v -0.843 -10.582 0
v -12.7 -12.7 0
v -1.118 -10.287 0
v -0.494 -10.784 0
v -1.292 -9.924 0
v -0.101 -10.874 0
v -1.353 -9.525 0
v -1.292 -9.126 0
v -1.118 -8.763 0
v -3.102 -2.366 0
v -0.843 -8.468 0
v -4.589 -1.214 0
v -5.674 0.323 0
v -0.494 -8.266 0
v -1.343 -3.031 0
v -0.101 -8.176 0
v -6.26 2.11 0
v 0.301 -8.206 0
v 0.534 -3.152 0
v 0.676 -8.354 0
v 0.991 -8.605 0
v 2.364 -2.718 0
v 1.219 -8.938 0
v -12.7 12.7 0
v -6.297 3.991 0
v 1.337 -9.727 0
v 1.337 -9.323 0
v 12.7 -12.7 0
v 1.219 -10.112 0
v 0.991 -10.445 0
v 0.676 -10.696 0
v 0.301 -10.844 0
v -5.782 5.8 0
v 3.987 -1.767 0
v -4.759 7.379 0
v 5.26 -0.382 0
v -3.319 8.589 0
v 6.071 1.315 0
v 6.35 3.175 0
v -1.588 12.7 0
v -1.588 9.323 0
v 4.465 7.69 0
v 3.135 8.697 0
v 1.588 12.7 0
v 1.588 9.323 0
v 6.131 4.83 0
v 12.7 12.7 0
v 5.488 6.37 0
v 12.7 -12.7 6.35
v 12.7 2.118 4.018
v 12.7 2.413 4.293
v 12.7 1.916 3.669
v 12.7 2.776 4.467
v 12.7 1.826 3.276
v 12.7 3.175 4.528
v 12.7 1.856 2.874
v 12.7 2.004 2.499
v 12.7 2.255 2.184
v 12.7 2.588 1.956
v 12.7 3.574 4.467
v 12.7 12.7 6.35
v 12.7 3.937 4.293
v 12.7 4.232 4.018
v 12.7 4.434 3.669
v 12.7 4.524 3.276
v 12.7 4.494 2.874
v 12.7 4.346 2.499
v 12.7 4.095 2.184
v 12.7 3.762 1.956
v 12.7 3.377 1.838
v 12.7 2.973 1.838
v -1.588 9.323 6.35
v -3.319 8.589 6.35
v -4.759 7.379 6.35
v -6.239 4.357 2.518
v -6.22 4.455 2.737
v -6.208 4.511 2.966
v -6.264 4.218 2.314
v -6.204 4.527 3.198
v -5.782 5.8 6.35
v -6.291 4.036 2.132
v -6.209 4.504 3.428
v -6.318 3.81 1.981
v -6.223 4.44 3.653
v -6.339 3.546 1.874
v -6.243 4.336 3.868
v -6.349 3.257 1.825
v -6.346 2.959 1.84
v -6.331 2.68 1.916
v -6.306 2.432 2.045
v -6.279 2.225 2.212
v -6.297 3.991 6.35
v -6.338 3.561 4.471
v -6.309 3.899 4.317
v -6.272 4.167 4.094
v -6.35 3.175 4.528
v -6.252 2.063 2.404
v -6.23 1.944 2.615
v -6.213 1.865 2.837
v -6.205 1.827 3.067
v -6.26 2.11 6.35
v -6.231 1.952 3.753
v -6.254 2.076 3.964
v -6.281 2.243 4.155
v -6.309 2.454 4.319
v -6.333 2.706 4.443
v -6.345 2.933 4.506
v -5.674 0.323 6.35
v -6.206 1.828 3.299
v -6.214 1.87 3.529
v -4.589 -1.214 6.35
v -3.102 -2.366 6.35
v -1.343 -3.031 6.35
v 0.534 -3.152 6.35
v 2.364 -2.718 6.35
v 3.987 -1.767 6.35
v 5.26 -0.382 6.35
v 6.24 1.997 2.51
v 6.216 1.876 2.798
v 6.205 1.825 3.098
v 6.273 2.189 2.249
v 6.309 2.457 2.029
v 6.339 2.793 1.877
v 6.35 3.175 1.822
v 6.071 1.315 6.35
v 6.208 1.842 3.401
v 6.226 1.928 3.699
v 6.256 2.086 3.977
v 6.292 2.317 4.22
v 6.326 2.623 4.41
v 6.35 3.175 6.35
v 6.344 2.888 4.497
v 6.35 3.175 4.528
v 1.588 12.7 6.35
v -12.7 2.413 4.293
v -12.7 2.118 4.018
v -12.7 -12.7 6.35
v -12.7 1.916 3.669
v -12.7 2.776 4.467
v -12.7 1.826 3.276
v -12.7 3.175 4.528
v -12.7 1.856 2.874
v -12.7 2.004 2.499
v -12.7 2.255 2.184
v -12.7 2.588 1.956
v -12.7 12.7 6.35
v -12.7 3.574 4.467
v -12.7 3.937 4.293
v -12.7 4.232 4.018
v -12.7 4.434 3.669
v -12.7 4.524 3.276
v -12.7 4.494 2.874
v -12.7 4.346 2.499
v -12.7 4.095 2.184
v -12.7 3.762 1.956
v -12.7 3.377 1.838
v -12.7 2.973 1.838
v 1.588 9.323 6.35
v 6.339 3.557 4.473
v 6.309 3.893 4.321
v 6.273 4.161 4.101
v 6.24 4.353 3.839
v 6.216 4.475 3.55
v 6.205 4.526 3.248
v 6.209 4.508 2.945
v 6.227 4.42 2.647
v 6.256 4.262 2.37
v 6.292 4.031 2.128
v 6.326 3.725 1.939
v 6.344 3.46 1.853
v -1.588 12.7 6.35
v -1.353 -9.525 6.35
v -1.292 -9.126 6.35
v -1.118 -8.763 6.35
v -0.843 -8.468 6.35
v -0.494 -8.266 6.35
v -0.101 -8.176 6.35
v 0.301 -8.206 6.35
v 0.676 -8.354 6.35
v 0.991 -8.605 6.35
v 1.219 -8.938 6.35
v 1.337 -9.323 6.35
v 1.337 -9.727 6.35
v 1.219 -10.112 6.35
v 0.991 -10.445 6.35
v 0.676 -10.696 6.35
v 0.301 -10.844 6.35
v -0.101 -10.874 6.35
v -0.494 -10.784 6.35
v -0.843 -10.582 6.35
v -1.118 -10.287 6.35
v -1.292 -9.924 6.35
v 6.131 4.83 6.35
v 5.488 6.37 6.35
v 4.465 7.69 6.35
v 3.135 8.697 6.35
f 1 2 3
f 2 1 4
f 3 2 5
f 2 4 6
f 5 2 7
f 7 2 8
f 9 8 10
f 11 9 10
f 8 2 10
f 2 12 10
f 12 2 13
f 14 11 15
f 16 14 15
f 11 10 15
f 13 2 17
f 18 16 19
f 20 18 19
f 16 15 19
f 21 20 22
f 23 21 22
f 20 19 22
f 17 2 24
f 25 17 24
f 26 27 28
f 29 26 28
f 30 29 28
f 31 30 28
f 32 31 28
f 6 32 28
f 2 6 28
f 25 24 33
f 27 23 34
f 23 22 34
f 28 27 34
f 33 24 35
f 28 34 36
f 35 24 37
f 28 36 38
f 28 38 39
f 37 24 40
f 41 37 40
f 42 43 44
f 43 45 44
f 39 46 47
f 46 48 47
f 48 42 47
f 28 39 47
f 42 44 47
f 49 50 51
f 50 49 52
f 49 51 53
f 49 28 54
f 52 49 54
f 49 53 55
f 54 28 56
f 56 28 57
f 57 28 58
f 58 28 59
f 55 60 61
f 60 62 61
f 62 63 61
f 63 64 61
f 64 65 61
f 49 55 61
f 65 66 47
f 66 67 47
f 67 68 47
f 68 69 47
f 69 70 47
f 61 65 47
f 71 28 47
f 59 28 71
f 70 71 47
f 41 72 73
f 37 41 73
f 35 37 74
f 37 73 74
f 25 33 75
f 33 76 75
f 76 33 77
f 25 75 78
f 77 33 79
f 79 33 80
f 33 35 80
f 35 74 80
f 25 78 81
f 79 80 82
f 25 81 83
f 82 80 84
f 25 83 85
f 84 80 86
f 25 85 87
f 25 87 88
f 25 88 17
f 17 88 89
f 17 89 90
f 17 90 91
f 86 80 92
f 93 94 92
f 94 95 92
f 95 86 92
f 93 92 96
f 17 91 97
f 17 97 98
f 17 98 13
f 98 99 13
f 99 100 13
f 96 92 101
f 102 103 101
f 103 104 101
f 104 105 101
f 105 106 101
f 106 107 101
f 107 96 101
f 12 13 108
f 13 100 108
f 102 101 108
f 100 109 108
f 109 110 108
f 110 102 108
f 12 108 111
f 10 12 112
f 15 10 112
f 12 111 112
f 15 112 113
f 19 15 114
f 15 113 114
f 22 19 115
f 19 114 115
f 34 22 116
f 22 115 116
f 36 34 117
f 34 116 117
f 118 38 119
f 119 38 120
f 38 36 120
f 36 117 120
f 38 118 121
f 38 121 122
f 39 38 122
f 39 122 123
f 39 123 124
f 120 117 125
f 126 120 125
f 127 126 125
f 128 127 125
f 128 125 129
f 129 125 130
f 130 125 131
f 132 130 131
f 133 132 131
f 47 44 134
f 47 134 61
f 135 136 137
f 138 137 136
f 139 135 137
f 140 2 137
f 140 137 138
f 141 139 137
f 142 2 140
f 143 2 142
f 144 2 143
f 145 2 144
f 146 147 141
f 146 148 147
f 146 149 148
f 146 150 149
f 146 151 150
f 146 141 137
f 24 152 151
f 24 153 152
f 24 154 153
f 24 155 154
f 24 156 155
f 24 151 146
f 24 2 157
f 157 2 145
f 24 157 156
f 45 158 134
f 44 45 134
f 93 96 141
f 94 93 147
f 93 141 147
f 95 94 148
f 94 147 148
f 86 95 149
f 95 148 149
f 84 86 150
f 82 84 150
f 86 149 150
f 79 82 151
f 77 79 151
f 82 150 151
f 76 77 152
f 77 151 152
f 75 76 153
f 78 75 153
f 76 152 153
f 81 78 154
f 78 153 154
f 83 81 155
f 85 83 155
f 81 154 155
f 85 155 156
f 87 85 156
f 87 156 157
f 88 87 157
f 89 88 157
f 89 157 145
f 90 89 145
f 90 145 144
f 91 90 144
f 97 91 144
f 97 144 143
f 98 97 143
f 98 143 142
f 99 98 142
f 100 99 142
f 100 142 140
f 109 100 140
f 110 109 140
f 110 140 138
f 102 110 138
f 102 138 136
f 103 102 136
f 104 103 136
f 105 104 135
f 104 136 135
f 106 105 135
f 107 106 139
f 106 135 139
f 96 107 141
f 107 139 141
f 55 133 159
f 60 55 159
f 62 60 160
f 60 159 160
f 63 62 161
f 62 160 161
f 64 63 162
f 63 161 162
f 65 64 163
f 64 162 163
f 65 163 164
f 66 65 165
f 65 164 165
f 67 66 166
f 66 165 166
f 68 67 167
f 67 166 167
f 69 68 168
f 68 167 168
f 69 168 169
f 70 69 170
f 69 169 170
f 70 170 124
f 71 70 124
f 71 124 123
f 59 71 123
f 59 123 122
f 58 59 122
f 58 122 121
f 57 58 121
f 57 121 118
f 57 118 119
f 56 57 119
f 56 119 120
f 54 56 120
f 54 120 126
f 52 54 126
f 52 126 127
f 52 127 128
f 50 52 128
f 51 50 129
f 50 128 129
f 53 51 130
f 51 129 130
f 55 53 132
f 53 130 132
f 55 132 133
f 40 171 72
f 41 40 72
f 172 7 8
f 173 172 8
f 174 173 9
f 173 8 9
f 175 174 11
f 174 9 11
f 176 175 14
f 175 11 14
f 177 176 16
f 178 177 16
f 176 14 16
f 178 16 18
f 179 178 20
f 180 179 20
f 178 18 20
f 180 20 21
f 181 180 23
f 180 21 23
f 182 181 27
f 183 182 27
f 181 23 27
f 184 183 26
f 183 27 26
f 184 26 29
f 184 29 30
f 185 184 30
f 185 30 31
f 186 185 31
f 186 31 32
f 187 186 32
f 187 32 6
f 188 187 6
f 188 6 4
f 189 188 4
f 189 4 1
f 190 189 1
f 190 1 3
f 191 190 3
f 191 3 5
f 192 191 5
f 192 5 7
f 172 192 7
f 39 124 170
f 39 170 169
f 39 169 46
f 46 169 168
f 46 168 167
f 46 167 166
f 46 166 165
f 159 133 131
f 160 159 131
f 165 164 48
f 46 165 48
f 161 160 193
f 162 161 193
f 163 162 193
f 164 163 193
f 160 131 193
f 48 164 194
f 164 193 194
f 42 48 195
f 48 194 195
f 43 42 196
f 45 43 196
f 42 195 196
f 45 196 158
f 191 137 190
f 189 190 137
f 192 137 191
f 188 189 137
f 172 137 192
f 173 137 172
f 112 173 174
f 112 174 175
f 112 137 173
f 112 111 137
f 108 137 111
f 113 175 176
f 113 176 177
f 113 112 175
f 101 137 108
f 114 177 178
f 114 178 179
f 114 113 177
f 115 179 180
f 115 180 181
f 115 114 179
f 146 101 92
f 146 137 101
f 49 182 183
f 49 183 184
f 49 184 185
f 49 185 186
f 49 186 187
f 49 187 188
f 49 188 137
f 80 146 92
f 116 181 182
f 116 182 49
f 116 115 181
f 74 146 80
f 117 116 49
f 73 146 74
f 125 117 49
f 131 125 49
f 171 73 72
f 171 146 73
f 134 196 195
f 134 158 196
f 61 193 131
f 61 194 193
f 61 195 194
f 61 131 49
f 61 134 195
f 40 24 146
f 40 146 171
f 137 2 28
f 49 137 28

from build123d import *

# Parameters (mm, degrees)
SKETCH1_W             = 25.4
SKETCH1_H             = 25.4
BOSS_EXTRUDE1_DEPTH   = 6.35
CUT_EXTRUDE1_DEPTH    = 20.05
F_6_32_TAPPED_HOLE1_D = 2.7051
F_6_32_TAPPED_HOLE2_D = 2.7051


with BuildPart() as part:
    # Sketch1 → Boss-Extrude1 (new body)
    with BuildSketch(Plane.XY):
        Rectangle(SKETCH1_W, SKETCH1_H)
    extrude(amount=BOSS_EXTRUDE1_DEPTH)

    # Sketch2 → Cut-Extrude1 (cut, through all)
    with BuildSketch(Plane.XY.offset(6.35)):
        with BuildLine():
            Line((-1.5875, 9.323361062), (-1.5875, 1.740204949))
            Line((-1.5875, 1.740204949), (1.5875, 1.740204949))
            Line((1.5875, 1.740204949), (1.5875, 9.323361062))
            ThreePointArc((1.5875, 9.323361062), (0, 9.525), (-1.5875, 9.323361062))
        make_face()
        with BuildLine():
            Line((1.5875, 1.740204949), (-1.5875, 1.740204949))
            Line((-1.5875, 1.740204949), (-1.5875, 9.323361062))
            ThreePointArc((-1.5875, 9.323361062), (-3.888564967, -1.845115786), (6.35, 3.175))
            ThreePointArc((6.35, 3.175), (5.020115786, 7.063564967), (1.5875, 9.323361062))
            Line((1.5875, 9.323361062), (1.5875, 1.740204949))
        make_face()
        with BuildLine():
            Line((-1.5875, 12.7), (-1.5875, 9.323361062))
            ThreePointArc((-1.5875, 9.323361062), (0, 9.525), (1.5875, 9.323361062))
            Line((1.5875, 9.323361062), (1.5875, 12.7))
            Line((1.5875, 12.7), (-1.5875, 12.7))
        make_face()
    extrude(amount=-CUT_EXTRUDE1_DEPTH, mode=Mode.SUBTRACT)

    # #6-32 Tapped Hole1 (through all)
    with Locations(Plane(origin=(12.7, 0, 0), x_dir=(0, 0, -1), z_dir=(1, 0, 0))):
        with Locations((-3.175, 3.175)):
            Hole(F_6_32_TAPPED_HOLE1_D / 2)

    # #6-32 Tapped Hole2 (through all)
    with Locations(Plane.XY.offset(6.35)):
        with Locations((0, -9.525)):
            Hole(F_6_32_TAPPED_HOLE2_D / 2)


solid = part.part
